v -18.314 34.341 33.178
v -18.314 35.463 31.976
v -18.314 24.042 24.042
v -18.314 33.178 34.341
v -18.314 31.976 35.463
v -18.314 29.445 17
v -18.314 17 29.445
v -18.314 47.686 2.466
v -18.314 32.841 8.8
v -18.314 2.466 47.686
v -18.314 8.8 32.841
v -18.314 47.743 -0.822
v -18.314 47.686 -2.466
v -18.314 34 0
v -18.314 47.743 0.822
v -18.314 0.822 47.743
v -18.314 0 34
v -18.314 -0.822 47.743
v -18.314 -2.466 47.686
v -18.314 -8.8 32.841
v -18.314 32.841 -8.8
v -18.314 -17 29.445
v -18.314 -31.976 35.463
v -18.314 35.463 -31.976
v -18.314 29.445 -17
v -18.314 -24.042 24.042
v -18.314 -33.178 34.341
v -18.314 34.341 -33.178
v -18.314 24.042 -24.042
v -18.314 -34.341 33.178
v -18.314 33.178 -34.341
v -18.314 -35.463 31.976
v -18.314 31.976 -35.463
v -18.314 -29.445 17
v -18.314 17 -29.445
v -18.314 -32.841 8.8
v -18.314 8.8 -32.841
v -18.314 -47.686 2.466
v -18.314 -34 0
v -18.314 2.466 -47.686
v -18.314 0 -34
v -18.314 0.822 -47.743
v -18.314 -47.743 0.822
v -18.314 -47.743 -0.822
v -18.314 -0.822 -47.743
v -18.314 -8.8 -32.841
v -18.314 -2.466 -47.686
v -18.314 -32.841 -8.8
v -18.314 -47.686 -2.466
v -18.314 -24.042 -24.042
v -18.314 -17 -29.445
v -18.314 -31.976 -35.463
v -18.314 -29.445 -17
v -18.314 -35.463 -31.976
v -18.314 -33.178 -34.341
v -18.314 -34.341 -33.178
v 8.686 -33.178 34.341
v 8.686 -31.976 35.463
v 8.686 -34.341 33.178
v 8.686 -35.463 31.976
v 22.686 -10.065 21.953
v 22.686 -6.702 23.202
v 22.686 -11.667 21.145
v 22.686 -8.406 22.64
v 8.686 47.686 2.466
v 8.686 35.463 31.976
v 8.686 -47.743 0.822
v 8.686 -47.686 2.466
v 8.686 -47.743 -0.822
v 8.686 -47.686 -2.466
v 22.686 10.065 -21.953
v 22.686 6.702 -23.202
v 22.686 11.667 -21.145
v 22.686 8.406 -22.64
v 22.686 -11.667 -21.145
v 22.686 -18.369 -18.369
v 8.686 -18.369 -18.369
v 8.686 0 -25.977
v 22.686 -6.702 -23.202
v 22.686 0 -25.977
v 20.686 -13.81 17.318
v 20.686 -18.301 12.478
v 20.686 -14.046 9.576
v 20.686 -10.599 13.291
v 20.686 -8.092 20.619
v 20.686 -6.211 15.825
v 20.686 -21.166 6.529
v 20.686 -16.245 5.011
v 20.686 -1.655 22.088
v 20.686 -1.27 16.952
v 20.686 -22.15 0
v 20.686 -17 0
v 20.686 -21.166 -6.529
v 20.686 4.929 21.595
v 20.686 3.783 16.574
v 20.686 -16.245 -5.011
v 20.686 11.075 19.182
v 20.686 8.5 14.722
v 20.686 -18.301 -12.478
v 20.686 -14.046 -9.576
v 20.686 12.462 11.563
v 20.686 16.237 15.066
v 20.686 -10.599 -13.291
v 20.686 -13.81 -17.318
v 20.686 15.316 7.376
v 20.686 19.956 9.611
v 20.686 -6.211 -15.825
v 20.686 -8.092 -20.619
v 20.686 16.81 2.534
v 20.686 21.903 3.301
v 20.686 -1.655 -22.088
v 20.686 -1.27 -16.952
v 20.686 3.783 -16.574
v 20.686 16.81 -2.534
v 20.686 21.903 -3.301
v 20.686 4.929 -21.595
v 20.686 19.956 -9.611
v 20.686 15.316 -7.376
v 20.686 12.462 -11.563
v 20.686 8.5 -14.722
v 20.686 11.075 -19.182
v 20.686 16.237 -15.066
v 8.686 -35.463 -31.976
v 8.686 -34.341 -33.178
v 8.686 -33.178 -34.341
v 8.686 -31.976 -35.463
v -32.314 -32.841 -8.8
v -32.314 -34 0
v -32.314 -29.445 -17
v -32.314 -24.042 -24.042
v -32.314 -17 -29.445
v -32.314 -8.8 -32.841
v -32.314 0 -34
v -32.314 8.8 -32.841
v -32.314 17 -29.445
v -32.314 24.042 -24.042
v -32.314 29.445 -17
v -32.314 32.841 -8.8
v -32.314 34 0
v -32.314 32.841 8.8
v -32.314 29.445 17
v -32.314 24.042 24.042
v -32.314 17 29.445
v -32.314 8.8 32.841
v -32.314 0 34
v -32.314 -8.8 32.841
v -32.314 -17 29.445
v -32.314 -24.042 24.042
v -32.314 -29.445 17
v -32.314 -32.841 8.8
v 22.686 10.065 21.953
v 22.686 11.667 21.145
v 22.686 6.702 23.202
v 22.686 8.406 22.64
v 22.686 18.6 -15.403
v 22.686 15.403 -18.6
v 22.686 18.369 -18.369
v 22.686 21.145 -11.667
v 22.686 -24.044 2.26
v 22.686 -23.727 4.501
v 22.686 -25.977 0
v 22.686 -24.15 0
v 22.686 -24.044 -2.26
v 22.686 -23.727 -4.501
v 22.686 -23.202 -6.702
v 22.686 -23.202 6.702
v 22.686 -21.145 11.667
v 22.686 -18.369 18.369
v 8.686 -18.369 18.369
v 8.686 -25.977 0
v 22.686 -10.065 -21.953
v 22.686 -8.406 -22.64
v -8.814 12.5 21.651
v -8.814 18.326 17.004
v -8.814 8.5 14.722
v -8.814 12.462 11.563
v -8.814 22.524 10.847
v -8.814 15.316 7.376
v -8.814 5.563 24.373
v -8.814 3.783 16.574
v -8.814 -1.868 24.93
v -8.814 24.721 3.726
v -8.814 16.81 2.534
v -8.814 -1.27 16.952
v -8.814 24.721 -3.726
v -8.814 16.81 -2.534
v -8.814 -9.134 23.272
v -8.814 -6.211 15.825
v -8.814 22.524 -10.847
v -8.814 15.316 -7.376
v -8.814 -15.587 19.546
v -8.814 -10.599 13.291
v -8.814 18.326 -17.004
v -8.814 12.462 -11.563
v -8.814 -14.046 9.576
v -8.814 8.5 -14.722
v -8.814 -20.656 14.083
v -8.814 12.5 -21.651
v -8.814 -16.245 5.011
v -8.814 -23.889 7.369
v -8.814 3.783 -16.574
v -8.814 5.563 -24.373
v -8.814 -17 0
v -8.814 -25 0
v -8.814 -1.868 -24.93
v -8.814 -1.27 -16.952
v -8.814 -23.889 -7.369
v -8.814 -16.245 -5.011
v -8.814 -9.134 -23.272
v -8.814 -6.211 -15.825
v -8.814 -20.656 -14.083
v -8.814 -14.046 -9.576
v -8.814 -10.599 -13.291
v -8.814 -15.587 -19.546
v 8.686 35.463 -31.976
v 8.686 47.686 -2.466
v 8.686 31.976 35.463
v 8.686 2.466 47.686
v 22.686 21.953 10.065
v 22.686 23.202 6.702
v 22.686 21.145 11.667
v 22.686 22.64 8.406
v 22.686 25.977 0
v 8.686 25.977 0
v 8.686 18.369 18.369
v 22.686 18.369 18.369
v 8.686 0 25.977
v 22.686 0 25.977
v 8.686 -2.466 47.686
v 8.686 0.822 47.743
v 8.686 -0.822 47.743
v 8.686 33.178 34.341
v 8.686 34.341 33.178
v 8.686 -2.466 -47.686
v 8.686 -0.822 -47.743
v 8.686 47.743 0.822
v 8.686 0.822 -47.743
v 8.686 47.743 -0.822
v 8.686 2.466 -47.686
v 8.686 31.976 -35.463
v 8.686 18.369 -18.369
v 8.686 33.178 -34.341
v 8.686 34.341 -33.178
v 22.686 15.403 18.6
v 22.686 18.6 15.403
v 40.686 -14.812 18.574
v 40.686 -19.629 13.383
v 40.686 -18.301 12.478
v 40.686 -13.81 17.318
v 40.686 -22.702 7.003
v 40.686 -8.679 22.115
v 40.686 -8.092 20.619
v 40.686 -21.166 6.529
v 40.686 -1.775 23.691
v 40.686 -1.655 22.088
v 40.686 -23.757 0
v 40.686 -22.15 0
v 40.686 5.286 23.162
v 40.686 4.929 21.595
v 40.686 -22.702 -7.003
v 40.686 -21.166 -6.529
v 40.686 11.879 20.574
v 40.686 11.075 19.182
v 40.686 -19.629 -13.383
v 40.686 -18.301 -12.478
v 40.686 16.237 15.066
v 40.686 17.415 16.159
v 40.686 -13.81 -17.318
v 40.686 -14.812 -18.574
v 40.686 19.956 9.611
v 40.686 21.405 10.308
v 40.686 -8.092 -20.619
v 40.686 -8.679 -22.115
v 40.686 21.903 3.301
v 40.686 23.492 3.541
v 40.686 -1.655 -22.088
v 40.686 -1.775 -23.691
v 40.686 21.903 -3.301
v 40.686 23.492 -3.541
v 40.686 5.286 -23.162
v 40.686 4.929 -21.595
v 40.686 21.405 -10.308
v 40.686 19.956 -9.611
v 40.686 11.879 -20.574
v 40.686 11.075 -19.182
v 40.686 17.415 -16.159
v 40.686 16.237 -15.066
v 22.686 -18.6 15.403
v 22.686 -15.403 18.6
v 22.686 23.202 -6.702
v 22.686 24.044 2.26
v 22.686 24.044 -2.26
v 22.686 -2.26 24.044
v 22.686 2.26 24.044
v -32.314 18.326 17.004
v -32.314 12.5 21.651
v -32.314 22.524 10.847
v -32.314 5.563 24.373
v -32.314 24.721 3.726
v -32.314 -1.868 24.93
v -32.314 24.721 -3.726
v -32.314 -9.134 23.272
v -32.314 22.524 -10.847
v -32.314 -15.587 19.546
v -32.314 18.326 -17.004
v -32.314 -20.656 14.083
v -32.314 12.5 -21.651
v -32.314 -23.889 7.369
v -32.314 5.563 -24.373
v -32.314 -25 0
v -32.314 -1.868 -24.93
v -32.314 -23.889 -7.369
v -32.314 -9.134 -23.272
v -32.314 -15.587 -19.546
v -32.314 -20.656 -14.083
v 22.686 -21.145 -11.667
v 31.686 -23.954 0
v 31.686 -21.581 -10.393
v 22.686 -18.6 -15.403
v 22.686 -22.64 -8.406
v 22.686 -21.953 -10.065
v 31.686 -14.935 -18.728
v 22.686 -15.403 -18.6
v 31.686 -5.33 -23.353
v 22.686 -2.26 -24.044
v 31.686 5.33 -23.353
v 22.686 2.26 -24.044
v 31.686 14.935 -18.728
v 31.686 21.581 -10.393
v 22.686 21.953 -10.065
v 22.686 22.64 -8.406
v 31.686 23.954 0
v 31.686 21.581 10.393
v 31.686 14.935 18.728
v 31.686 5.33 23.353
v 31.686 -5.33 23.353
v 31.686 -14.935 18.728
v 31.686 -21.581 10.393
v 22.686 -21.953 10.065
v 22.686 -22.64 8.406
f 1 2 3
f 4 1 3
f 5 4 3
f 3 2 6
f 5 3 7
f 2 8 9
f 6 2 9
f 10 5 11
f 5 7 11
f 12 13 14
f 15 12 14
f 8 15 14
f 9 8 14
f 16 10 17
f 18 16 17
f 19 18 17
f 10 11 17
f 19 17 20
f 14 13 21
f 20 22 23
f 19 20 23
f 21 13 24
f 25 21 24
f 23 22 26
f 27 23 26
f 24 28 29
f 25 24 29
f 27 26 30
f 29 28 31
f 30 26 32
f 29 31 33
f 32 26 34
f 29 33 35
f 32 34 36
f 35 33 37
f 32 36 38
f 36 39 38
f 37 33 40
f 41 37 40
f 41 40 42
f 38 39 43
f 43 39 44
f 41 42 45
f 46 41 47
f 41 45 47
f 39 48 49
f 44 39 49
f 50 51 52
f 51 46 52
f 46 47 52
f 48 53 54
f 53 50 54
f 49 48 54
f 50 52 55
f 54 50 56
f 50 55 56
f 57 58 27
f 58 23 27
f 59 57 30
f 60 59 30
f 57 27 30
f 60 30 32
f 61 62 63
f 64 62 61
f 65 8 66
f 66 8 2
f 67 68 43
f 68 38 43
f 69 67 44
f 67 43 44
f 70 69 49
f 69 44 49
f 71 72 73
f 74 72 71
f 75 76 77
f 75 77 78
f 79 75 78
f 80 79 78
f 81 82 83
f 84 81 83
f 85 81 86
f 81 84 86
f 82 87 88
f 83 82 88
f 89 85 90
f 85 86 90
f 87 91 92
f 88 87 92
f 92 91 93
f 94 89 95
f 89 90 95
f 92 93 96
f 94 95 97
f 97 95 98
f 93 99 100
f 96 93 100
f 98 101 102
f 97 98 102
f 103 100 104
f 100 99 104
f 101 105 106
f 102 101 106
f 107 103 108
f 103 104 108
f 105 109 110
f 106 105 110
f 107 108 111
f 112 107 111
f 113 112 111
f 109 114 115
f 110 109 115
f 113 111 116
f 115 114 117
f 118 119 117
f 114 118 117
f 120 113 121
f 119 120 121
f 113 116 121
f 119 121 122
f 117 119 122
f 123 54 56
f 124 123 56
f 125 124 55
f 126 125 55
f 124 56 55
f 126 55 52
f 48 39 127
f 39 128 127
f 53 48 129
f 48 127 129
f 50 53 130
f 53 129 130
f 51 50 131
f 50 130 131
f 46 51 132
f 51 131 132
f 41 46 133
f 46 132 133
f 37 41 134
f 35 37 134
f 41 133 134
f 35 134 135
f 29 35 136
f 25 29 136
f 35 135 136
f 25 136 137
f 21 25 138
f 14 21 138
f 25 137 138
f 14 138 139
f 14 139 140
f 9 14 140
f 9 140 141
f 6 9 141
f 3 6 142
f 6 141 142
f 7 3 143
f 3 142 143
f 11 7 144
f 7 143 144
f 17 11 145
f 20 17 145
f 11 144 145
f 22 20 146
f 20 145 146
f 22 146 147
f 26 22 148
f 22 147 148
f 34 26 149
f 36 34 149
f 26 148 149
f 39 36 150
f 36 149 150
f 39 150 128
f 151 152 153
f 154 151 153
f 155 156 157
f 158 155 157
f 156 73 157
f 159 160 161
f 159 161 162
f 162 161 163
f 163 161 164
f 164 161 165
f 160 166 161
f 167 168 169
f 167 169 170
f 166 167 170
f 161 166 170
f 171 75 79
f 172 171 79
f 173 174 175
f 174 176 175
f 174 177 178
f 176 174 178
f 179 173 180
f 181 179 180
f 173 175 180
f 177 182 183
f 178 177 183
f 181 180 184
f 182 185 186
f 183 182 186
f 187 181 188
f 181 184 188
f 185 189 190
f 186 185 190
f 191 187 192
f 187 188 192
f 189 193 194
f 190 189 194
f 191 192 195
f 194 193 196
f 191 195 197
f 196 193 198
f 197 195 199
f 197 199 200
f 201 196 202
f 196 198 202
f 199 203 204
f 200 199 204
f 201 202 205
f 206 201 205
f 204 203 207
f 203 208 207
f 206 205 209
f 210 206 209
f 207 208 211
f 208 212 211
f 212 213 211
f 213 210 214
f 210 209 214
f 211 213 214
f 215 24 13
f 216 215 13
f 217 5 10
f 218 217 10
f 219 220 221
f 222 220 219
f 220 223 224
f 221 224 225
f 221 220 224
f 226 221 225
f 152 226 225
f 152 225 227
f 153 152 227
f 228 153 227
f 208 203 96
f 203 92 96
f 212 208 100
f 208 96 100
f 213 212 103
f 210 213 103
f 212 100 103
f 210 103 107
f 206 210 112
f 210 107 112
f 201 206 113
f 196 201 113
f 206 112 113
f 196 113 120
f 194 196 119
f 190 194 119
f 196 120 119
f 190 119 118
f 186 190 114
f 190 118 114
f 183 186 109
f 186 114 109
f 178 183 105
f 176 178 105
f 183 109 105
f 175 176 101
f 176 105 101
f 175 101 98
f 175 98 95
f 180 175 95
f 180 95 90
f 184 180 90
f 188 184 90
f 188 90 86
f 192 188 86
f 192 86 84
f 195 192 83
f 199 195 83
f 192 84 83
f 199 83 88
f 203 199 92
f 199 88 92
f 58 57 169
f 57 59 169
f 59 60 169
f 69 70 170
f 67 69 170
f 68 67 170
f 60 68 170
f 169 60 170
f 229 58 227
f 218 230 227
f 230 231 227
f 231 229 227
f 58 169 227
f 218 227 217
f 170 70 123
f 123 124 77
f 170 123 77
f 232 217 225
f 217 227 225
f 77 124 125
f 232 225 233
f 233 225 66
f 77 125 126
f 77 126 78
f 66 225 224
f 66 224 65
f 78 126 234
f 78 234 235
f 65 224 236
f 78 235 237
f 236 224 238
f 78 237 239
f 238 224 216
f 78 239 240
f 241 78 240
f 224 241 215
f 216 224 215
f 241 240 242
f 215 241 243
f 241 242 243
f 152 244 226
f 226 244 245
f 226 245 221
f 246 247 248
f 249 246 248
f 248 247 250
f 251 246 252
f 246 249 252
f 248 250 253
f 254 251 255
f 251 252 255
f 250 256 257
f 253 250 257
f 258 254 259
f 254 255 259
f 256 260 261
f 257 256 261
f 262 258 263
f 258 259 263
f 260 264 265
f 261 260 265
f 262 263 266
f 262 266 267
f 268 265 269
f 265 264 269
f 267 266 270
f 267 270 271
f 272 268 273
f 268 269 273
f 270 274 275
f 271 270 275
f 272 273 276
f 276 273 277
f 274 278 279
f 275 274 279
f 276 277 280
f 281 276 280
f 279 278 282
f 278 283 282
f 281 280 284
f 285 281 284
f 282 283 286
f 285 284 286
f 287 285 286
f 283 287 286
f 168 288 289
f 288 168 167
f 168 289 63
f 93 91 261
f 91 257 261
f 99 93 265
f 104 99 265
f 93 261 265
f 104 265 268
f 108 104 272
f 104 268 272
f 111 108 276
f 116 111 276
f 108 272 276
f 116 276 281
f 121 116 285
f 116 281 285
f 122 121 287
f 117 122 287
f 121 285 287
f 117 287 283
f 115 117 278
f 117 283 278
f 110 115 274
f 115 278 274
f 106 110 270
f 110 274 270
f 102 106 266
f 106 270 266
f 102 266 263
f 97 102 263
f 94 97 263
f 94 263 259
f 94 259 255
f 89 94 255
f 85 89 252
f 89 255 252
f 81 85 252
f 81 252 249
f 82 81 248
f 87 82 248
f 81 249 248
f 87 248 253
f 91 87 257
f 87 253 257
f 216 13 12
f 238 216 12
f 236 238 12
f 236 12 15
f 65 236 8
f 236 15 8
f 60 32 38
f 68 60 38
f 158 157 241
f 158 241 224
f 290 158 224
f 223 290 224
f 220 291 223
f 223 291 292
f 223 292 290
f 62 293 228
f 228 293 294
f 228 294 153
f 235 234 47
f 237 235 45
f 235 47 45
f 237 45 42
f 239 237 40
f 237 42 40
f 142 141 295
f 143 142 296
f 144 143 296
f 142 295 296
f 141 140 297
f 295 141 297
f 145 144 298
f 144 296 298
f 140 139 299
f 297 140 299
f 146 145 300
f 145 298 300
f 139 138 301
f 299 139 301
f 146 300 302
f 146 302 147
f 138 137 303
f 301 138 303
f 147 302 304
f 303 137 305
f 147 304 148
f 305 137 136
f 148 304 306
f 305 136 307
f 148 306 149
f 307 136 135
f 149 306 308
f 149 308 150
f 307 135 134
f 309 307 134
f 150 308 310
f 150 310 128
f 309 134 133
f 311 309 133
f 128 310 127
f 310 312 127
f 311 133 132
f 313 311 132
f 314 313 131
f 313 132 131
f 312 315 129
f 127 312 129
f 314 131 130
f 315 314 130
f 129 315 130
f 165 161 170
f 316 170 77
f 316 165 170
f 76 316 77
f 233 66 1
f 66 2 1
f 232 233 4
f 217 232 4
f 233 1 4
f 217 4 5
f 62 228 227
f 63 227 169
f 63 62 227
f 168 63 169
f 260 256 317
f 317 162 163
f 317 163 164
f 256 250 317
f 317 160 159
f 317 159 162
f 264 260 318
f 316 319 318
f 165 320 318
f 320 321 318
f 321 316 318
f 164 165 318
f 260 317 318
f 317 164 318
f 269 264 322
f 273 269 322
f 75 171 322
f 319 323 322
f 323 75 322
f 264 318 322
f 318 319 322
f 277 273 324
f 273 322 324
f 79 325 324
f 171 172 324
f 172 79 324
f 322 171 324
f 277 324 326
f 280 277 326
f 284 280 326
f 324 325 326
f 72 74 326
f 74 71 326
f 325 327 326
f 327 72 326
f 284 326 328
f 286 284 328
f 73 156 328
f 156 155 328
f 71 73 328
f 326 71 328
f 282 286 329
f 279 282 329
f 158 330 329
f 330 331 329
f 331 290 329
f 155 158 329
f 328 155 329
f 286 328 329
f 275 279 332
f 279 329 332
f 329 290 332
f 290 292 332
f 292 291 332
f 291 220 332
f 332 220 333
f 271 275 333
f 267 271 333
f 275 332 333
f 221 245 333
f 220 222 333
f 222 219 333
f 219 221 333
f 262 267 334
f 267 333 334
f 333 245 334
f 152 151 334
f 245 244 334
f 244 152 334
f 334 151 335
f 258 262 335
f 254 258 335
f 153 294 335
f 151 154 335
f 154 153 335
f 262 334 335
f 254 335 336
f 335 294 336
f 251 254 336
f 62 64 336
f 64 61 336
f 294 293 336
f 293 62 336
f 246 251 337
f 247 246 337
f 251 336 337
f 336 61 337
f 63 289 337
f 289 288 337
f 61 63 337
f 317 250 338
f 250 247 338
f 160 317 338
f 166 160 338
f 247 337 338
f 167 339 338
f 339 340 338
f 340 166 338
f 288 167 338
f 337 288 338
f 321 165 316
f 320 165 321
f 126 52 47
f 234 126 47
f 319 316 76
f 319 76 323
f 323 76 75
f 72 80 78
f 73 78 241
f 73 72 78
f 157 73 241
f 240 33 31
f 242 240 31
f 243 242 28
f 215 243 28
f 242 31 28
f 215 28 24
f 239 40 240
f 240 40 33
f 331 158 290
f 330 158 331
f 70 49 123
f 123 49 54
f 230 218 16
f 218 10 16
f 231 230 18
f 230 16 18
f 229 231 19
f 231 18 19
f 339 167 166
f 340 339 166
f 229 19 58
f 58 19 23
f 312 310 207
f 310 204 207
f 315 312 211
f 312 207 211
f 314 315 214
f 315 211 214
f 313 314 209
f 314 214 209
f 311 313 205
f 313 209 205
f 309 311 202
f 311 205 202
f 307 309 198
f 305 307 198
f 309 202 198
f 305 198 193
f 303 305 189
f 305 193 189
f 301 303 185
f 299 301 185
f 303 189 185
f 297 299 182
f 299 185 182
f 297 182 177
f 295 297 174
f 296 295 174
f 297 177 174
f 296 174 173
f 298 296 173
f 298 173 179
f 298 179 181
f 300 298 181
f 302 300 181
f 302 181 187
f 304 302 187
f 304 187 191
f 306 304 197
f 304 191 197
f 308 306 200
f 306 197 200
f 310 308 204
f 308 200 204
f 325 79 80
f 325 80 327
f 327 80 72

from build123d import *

# Parameters (mm, degrees)
CUT_EXTRUDE1_START = -27
SKETCH2_R          = 61.415464326
CUT_EXTRUDE1_DEPTH = 27
SKETCH3_R          = 40.122085913
CUT_EXTRUDE2_DEPTH = 14


with BuildPart() as part:
    # Sketch1 → Revolve1 (revolve)
    with BuildSketch(Plane.XY):
        Polygon((-32.314138911, -25), (-8.814138911, -25), (-8.814138911, -17), (20.685861089, -17), (20.685861089, -22.15), (40.685861089, -22.15), (40.685861089, -23.757238603), (22.685861089, -24.15), (22.685861089, -34.74048531), (8.685861089, -34.74048531), (8.685861089, -47.75), (-18.314138911, -47.75), (-18.314138911, -34), (-32.314138911, -34), align=None)
    revolve(axis=Axis((0, 0, 0), (1, 0, 0)))

    # Sketch2 → Cut-Extrude1 (cut)
    with BuildSketch(Plane(origin=(8.685861089, 0, 0), x_dir=(0, 0, -1), z_dir=(1, 0, 0)).offset(CUT_EXTRUDE1_START)):
        Circle(SKETCH2_R)
        Polygon((0, 48.707649013), (-34.441508913, 34.441508913), (-48.707649013, 0), (-34.441508913, -34.441508913), (0, -48.707649013), (34.441508913, -34.441508913), (48.707649013, 0), (34.441508913, 34.441508913), align=None, mode=Mode.SUBTRACT)
    extrude(amount=CUT_EXTRUDE1_DEPTH, mode=Mode.SUBTRACT)

    # Sketch3 → Cut-Extrude2 (cut)
    with BuildSketch(Plane(origin=(22.685861089, 0, 0), x_dir=(0, 0, -1), z_dir=(1, 0, 0))):
        Circle(SKETCH3_R)
        Polygon((0, 25.977412807), (-18.368804754, 18.368804754), (-25.977412807, 0), (-18.368804754, -18.368804754), (0, -25.977412807), (18.368804754, -18.368804754), (25.977412807, 0), (18.368804754, 18.368804754), align=None, mode=Mode.SUBTRACT)
    extrude(amount=-CUT_EXTRUDE2_DEPTH, mode=Mode.SUBTRACT)


solid = part.part
